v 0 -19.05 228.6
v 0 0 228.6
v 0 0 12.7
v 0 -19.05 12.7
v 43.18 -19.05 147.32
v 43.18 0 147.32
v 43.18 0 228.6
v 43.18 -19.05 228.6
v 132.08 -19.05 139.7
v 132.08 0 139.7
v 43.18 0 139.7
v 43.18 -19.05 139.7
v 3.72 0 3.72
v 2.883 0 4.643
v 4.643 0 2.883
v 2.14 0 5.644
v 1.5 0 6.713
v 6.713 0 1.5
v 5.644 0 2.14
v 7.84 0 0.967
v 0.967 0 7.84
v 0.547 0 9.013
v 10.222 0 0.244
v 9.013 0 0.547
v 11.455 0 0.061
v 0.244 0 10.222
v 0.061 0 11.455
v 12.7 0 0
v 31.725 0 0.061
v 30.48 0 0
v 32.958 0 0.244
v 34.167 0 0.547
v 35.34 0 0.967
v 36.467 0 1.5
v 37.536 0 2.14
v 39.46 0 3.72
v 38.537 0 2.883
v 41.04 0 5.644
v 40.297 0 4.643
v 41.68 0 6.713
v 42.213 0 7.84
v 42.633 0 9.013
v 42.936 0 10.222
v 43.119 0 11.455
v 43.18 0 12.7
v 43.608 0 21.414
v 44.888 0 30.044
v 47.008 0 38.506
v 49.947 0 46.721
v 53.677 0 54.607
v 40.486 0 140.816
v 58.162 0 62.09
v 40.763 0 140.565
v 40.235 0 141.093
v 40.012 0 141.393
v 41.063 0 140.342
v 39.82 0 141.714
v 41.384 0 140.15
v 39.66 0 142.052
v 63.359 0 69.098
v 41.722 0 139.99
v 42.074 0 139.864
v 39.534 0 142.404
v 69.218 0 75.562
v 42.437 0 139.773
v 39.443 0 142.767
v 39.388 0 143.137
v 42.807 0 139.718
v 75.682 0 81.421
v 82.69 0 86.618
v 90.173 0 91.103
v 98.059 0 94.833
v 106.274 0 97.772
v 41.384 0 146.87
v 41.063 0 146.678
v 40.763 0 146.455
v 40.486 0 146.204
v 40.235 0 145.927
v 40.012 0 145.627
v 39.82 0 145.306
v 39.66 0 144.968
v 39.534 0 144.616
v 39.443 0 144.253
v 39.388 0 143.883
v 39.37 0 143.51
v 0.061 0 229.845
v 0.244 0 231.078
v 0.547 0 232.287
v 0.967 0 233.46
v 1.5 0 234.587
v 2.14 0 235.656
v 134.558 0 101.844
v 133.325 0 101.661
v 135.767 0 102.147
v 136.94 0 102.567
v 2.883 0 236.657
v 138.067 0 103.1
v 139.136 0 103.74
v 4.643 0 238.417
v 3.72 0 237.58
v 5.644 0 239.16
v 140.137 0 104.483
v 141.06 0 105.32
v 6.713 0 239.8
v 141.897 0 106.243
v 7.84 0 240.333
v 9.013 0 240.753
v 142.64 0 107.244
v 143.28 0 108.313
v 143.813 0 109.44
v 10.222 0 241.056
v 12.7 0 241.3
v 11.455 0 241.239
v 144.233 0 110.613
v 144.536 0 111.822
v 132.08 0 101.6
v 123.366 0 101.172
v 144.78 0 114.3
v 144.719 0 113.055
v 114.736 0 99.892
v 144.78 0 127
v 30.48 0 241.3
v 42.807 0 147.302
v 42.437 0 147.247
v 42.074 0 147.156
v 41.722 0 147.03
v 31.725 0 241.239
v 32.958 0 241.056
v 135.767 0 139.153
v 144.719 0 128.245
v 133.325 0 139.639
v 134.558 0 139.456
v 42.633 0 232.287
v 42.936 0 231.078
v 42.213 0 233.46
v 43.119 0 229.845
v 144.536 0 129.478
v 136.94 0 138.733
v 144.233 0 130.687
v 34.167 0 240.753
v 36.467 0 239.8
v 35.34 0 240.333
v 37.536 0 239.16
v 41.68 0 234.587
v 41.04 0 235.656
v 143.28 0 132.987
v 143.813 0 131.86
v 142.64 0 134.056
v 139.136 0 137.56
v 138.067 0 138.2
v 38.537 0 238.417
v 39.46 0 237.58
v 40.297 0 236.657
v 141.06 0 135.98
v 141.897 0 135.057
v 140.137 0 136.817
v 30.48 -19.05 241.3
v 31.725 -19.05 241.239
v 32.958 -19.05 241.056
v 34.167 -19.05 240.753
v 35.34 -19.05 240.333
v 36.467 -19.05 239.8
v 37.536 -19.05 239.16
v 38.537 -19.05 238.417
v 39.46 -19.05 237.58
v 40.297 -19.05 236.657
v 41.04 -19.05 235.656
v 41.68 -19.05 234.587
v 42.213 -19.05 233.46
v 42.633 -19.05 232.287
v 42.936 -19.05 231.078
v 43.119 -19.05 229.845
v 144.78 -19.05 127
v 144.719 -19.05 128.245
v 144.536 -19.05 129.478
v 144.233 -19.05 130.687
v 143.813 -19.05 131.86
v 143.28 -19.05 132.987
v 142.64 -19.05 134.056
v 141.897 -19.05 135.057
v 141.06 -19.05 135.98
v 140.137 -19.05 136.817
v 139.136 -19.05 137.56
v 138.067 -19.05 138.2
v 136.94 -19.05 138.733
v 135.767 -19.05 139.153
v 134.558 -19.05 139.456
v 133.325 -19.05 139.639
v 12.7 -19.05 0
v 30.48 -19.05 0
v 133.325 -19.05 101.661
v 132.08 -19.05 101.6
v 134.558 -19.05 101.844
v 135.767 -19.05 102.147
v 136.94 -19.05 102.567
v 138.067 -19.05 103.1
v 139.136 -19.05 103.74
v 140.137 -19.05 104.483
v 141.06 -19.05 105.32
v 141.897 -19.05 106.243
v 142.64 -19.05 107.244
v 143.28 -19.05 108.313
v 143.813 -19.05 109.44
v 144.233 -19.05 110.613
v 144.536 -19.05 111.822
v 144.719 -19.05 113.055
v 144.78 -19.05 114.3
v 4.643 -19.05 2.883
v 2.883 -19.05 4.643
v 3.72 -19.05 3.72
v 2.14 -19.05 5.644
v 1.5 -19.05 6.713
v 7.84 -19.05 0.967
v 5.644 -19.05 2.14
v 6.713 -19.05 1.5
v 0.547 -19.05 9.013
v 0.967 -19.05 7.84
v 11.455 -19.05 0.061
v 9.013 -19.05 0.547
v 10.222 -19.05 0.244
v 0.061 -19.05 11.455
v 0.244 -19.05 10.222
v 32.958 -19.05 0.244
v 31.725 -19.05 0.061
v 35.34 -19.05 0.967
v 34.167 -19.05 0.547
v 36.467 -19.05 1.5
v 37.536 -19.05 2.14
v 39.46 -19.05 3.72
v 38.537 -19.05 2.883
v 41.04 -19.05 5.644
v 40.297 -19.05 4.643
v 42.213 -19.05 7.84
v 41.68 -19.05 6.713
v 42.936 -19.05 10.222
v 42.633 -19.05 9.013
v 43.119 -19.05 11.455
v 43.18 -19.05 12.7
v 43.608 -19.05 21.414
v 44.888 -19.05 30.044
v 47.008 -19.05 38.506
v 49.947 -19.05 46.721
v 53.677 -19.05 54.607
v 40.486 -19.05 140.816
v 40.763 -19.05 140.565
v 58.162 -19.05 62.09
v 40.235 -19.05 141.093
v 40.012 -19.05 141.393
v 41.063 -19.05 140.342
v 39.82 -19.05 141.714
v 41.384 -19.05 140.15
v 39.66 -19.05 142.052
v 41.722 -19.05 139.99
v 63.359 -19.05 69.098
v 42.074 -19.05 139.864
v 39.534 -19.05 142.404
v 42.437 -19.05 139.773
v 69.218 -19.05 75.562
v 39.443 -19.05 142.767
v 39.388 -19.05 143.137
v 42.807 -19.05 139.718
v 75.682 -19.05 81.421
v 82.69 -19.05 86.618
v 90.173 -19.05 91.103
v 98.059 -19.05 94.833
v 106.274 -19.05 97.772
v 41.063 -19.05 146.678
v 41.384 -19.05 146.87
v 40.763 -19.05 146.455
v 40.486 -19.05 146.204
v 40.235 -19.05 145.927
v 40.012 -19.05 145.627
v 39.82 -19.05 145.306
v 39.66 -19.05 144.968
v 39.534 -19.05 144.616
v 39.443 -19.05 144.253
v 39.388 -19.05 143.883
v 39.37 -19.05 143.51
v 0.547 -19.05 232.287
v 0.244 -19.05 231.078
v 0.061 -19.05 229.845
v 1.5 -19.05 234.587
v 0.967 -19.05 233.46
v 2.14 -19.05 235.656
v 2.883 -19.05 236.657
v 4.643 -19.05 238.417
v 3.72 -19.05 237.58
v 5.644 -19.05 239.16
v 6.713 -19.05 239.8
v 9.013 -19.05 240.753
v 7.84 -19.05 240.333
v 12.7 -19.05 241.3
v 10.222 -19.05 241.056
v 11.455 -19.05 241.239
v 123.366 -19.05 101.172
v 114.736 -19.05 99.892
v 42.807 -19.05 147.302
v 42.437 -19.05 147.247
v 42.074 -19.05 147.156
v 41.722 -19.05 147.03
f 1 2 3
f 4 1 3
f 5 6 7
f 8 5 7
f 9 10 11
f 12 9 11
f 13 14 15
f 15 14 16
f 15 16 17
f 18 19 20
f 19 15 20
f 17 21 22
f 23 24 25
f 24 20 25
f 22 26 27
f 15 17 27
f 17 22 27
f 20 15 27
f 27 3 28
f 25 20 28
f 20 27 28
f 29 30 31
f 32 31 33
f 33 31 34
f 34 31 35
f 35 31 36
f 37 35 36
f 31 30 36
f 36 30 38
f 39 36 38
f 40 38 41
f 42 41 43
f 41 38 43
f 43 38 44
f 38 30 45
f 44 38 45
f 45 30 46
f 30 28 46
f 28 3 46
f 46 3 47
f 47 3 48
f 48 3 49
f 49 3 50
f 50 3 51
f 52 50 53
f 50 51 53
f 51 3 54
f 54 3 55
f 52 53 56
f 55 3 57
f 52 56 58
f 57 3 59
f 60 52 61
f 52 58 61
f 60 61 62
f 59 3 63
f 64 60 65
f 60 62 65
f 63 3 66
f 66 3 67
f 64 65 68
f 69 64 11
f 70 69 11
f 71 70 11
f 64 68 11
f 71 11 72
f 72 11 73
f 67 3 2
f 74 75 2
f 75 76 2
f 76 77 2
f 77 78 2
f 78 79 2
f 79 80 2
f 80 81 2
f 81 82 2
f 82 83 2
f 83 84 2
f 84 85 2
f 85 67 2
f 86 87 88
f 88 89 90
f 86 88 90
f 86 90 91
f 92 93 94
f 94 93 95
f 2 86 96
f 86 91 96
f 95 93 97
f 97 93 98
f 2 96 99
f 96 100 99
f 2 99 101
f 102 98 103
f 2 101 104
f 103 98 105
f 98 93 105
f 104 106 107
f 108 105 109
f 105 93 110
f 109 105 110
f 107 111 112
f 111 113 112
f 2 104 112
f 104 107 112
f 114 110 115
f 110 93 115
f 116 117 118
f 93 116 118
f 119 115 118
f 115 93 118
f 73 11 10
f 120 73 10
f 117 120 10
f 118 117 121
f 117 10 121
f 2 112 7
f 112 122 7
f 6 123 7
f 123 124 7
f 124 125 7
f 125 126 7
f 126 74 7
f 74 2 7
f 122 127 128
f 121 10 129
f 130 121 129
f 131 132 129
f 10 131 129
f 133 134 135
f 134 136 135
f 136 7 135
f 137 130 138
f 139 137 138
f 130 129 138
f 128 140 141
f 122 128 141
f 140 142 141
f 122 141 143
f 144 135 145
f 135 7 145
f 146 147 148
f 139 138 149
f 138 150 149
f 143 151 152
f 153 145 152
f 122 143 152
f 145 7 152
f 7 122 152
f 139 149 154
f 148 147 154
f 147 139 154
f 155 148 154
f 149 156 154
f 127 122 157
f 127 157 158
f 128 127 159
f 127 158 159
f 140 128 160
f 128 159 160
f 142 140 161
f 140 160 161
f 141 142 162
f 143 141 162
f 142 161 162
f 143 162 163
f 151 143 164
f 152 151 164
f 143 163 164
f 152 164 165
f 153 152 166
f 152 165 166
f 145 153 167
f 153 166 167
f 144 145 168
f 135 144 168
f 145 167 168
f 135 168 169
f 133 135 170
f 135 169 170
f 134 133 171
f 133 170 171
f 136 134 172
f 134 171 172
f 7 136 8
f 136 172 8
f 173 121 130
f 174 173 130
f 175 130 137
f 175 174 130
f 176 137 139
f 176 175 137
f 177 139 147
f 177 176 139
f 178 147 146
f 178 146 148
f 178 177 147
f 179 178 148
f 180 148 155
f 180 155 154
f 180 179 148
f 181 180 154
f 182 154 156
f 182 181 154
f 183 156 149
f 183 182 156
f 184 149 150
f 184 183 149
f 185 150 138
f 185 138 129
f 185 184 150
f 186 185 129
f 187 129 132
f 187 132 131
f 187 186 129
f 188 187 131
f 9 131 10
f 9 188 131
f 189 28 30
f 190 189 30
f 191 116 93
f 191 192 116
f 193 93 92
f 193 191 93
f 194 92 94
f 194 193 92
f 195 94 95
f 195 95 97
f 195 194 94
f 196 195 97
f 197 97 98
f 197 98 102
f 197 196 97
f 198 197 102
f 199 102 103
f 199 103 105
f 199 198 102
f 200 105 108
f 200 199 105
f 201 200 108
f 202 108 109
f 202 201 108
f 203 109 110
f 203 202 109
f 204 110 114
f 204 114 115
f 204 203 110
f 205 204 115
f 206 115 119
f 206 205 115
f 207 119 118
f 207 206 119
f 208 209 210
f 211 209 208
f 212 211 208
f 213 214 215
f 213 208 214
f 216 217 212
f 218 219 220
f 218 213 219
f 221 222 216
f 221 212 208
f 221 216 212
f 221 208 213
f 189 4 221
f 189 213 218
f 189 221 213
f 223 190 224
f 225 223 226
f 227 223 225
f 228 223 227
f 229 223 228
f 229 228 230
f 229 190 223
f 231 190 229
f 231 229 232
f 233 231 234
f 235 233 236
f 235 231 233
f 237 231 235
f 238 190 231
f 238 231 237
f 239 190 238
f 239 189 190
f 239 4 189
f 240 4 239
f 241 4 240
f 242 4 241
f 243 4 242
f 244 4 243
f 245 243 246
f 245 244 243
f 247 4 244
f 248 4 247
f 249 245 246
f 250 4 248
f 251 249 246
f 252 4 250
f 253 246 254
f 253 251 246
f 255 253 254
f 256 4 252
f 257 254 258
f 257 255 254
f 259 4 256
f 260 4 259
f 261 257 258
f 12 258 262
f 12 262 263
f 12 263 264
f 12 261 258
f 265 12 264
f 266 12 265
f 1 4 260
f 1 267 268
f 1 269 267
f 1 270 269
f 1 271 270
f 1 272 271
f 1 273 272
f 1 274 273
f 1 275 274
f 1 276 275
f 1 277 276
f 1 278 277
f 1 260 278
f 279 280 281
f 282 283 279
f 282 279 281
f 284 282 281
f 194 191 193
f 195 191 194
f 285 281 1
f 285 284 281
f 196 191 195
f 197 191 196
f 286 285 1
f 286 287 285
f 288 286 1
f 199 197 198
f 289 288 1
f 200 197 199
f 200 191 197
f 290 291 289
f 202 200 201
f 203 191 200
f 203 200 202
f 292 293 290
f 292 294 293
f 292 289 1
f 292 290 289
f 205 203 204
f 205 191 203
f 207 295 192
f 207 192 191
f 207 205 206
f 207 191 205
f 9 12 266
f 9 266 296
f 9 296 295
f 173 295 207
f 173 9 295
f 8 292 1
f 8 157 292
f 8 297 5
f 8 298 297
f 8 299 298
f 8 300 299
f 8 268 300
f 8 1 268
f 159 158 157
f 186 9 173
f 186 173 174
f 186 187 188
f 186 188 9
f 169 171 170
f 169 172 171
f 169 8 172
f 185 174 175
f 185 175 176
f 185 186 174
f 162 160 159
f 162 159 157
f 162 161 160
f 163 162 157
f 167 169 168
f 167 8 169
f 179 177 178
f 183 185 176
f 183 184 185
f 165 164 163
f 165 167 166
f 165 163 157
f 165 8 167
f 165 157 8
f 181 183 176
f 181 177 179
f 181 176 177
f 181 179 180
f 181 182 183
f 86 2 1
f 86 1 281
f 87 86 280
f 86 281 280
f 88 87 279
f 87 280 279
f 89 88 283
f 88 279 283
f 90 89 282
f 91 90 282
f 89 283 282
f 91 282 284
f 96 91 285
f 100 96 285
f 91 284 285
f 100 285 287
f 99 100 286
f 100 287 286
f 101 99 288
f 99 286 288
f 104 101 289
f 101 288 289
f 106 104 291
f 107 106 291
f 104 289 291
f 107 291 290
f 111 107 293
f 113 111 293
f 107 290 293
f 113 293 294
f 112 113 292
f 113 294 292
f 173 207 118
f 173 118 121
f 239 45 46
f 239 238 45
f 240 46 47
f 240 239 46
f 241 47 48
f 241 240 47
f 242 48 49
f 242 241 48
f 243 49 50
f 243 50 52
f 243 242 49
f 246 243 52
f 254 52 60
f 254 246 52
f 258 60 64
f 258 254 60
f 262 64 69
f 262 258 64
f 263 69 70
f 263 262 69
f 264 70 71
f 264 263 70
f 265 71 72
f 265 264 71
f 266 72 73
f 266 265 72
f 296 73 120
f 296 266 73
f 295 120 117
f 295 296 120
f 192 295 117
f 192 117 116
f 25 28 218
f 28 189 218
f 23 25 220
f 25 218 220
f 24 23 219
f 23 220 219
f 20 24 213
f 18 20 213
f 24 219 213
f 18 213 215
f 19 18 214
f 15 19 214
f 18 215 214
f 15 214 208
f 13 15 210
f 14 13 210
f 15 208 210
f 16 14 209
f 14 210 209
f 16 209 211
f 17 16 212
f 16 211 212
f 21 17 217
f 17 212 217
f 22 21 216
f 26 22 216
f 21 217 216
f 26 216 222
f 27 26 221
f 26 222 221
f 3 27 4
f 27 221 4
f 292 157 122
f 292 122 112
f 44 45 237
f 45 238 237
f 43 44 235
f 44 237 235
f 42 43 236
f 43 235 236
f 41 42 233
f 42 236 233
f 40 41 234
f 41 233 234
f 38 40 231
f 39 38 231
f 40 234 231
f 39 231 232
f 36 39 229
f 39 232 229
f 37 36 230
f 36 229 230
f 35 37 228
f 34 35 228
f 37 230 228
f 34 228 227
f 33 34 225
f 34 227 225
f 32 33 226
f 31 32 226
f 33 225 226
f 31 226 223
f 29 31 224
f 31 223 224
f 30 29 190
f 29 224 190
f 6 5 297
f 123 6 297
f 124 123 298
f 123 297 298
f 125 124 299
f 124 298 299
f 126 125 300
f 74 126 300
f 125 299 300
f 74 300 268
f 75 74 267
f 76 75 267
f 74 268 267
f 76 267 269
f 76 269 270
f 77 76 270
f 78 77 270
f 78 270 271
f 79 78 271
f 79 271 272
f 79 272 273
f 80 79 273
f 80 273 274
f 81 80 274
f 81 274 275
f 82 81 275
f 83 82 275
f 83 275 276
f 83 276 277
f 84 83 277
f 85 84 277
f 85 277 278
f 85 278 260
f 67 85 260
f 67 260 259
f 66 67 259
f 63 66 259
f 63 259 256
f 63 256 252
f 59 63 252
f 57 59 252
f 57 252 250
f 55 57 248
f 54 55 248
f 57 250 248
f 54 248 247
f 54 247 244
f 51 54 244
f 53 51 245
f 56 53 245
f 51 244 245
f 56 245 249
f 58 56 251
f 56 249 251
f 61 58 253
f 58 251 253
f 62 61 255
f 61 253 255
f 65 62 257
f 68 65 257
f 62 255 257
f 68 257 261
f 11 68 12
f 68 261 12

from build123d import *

# Parameters (mm, degrees)
F1_DEPTH = 19.05
F2_R     = 88.9
F3_R     = 12.69999
F5_DEPTH = 19.051


# Not quite as in the source:
# - a fillet or chamfer is up to 0.001 mm smaller than in the source, because OpenCascade refuses the exact size


with BuildPart() as f1:
    # F0 (on Front) → F1 (new body)
    with BuildSketch(Plane.XZ):
        Polygon((0, 241.3), (0, 0), (43.18, 0), (43.18, 101.6), (144.78, 101.6), (144.78, 139.7), (43.18, 139.7), (43.18, 241.3), align=None)
    extrude(amount=F1_DEPTH)

    # F2
    f2_edges = [f1.edges().sort_by_distance(p)[0] for p in [
        (43.18, -9.525, 101.6),
    ]]
    fillet(f2_edges, radius=F2_R)

    # F3 (radius 12.7 in the source; OpenCascade refuses exactly that, so slightly less here)
    f3_edges = [f1.edges().sort_by_distance(p)[0] for p in [
        (144.78, -9.525, 139.7),
        (144.78, -9.525, 101.6),
        (43.18, -9.525, 0),
        (43.18, -9.525, 241.3),
        (0, -9.525, 0),
        (0, -9.525, 241.3),
    ]]
    fillet(f3_edges, radius=F3_R)

    # F4 (on face) → F5 (cut, through all)
    with BuildSketch(Plane.XZ.offset(19.05)):
        with BuildLine():
            Line((43.18, 139.7), (43.18, 147.32))
            ThreePointArc((43.18, 147.32), (39.37, 143.51), (43.18, 139.7))
        make_face()
    extrude(amount=-F5_DEPTH, mode=Mode.SUBTRACT)


solid = f1.part
